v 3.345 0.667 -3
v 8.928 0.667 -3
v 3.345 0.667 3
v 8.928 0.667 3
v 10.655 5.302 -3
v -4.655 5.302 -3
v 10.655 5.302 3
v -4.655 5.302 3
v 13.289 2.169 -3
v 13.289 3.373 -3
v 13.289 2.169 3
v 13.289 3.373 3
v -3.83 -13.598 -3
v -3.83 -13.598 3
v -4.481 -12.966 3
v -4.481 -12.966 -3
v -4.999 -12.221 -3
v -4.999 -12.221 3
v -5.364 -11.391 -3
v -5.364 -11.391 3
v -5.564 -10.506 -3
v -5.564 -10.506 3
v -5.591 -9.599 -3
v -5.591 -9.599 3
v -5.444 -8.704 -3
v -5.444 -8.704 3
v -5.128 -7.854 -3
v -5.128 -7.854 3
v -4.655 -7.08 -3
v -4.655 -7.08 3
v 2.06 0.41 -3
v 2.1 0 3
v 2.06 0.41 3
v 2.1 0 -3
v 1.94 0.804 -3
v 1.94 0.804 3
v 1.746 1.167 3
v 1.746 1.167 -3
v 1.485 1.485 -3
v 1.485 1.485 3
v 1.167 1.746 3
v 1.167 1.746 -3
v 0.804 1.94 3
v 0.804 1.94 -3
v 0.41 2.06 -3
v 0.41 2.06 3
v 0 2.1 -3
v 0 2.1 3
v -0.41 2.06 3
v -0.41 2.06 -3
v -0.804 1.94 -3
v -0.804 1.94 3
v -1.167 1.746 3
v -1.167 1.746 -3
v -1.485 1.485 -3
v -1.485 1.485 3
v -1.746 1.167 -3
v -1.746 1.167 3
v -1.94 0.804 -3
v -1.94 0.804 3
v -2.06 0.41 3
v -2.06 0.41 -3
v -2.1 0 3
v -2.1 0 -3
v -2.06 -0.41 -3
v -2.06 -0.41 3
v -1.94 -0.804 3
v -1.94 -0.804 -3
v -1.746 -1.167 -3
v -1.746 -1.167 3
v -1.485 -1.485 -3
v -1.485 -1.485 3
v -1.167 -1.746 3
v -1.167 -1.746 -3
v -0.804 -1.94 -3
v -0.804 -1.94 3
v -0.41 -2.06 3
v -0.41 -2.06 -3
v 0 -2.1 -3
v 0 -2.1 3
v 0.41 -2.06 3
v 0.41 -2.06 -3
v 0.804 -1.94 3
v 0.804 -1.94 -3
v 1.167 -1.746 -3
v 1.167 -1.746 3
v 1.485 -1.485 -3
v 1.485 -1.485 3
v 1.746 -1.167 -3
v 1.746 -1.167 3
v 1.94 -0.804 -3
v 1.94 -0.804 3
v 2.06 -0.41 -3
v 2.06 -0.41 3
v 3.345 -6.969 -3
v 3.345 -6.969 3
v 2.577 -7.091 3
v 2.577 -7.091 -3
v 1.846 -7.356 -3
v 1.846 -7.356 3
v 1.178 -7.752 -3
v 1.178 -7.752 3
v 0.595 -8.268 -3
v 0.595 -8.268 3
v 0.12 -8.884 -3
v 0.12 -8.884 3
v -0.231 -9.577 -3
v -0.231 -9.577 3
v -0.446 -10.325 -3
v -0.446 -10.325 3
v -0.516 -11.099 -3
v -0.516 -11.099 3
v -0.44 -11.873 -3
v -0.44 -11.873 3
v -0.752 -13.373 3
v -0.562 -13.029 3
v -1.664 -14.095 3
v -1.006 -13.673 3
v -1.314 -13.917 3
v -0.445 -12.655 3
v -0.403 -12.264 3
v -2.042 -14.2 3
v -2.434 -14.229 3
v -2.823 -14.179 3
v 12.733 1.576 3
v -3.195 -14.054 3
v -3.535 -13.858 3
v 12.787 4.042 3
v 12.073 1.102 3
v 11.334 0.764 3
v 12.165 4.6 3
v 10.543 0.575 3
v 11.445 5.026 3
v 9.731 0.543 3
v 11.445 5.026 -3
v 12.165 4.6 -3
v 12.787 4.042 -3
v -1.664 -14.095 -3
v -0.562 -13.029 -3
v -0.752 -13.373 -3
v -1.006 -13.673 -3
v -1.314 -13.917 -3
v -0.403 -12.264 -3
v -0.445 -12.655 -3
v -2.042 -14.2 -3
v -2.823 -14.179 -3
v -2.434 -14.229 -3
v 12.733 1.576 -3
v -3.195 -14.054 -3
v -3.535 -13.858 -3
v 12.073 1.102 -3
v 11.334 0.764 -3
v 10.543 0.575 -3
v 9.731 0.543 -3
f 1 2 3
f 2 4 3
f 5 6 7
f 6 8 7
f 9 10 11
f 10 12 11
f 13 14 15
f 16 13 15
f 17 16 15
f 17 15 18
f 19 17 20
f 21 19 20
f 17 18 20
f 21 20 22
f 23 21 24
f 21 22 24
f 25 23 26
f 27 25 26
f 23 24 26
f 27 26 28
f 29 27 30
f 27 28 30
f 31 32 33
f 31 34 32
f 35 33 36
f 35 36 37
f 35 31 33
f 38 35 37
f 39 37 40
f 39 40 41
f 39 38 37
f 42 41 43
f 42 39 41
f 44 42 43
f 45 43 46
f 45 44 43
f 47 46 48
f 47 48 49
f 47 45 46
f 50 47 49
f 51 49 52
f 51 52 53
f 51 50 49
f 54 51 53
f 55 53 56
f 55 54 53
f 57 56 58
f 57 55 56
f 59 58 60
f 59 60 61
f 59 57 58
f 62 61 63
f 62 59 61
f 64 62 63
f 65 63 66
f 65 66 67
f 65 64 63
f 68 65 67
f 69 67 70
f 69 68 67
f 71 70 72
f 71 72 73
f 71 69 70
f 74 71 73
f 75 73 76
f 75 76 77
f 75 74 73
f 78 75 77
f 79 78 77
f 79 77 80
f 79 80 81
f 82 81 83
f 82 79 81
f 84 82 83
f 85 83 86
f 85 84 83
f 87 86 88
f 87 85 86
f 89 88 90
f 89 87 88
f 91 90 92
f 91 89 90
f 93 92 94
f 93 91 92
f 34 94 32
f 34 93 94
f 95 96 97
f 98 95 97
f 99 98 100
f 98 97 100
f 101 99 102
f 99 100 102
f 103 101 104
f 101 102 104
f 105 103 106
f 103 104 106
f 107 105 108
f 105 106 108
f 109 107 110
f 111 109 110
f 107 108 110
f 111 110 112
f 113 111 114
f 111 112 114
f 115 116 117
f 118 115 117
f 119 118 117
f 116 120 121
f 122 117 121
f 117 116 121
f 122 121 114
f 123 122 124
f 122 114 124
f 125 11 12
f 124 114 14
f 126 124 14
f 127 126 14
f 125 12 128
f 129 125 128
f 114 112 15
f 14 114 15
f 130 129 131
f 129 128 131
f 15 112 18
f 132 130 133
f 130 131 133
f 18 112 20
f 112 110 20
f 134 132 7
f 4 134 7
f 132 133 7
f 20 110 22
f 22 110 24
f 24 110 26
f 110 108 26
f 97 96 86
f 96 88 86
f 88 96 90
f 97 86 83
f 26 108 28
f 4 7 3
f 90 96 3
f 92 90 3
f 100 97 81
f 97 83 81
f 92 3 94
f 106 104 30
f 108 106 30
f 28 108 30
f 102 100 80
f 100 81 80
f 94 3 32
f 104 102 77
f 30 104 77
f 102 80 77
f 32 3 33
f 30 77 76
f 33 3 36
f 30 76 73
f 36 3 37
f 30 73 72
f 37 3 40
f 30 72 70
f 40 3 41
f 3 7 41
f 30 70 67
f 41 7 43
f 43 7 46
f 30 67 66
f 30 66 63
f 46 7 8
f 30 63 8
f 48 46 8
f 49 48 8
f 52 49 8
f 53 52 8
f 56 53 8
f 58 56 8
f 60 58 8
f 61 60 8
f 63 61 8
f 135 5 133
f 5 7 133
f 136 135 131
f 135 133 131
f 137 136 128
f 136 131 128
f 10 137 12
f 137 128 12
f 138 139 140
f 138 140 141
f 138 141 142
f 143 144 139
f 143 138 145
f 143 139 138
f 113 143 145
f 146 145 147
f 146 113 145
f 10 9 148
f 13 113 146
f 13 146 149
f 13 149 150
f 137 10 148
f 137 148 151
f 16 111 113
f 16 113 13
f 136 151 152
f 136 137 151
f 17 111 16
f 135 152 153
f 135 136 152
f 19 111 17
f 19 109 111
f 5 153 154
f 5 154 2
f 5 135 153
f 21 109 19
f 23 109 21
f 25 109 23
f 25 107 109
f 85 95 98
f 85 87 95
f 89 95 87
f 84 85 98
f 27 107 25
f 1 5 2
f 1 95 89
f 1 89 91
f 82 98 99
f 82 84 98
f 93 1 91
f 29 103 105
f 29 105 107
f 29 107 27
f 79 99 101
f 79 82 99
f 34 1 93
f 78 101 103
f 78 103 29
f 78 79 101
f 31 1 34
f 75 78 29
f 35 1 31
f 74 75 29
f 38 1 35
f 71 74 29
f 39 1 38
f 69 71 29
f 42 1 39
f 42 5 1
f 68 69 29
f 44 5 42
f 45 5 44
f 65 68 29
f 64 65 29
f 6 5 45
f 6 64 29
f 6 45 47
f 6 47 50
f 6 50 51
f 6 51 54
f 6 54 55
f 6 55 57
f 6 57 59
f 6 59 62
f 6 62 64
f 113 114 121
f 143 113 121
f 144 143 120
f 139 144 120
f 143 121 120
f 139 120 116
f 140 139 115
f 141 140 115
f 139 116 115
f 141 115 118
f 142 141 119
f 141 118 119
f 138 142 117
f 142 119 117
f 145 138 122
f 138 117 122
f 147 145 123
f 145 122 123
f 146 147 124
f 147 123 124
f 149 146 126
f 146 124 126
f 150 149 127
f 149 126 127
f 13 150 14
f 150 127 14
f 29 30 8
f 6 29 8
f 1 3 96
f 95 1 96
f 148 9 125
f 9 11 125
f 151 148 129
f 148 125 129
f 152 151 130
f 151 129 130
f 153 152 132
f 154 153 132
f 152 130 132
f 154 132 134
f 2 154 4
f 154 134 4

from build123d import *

# Parameters (mm, degrees)
SKETCH_1_R      = 2.1
EXTRUDE_1_DEPTH = 3


with BuildPart() as part:
    # 스케치1 → 보스-돌출1 (new, symmetric)
    with BuildSketch(Plane.XY):
        with BuildLine():
            Line((-4.654662174, -7.079831659), (-4.654662174, 5.301751688))
            Line((-4.654662174, 5.301751688), (10.655145319, 5.301751688))
            ThreePointArc((10.655145319, 5.301751688), (12.164725545, 4.600439307), (13.28874021, 3.372733093))
            Line((13.28874021, 3.372733093), (13.28874021, 2.168909846))
            ThreePointArc((13.28874021, 2.168909846), (11.333538367, 0.764001831), (8.927874518, 0.66724324))
            Line((8.927874518, 0.66724324), (3.345337826, 0.66724324))
            Line((3.345337826, 0.66724324), (3.345337826, -6.968753808))
            ThreePointArc((3.345337826, -6.968753808), (0.343177667, -8.564508011), (-0.439769501, -11.873041045))
            ThreePointArc((-0.439769501, -11.873041045), (-1.484211123, -14.014409685), (-3.830025316, -13.597907913))
            ThreePointArc((-3.830025316, -13.597907913), (-5.564151963, -10.506098848), (-4.654662174, -7.079831659))
        make_face()
        Circle(SKETCH_1_R, mode=Mode.SUBTRACT)
    extrude(amount=EXTRUDE_1_DEPTH, both=True)


solid = part.part
